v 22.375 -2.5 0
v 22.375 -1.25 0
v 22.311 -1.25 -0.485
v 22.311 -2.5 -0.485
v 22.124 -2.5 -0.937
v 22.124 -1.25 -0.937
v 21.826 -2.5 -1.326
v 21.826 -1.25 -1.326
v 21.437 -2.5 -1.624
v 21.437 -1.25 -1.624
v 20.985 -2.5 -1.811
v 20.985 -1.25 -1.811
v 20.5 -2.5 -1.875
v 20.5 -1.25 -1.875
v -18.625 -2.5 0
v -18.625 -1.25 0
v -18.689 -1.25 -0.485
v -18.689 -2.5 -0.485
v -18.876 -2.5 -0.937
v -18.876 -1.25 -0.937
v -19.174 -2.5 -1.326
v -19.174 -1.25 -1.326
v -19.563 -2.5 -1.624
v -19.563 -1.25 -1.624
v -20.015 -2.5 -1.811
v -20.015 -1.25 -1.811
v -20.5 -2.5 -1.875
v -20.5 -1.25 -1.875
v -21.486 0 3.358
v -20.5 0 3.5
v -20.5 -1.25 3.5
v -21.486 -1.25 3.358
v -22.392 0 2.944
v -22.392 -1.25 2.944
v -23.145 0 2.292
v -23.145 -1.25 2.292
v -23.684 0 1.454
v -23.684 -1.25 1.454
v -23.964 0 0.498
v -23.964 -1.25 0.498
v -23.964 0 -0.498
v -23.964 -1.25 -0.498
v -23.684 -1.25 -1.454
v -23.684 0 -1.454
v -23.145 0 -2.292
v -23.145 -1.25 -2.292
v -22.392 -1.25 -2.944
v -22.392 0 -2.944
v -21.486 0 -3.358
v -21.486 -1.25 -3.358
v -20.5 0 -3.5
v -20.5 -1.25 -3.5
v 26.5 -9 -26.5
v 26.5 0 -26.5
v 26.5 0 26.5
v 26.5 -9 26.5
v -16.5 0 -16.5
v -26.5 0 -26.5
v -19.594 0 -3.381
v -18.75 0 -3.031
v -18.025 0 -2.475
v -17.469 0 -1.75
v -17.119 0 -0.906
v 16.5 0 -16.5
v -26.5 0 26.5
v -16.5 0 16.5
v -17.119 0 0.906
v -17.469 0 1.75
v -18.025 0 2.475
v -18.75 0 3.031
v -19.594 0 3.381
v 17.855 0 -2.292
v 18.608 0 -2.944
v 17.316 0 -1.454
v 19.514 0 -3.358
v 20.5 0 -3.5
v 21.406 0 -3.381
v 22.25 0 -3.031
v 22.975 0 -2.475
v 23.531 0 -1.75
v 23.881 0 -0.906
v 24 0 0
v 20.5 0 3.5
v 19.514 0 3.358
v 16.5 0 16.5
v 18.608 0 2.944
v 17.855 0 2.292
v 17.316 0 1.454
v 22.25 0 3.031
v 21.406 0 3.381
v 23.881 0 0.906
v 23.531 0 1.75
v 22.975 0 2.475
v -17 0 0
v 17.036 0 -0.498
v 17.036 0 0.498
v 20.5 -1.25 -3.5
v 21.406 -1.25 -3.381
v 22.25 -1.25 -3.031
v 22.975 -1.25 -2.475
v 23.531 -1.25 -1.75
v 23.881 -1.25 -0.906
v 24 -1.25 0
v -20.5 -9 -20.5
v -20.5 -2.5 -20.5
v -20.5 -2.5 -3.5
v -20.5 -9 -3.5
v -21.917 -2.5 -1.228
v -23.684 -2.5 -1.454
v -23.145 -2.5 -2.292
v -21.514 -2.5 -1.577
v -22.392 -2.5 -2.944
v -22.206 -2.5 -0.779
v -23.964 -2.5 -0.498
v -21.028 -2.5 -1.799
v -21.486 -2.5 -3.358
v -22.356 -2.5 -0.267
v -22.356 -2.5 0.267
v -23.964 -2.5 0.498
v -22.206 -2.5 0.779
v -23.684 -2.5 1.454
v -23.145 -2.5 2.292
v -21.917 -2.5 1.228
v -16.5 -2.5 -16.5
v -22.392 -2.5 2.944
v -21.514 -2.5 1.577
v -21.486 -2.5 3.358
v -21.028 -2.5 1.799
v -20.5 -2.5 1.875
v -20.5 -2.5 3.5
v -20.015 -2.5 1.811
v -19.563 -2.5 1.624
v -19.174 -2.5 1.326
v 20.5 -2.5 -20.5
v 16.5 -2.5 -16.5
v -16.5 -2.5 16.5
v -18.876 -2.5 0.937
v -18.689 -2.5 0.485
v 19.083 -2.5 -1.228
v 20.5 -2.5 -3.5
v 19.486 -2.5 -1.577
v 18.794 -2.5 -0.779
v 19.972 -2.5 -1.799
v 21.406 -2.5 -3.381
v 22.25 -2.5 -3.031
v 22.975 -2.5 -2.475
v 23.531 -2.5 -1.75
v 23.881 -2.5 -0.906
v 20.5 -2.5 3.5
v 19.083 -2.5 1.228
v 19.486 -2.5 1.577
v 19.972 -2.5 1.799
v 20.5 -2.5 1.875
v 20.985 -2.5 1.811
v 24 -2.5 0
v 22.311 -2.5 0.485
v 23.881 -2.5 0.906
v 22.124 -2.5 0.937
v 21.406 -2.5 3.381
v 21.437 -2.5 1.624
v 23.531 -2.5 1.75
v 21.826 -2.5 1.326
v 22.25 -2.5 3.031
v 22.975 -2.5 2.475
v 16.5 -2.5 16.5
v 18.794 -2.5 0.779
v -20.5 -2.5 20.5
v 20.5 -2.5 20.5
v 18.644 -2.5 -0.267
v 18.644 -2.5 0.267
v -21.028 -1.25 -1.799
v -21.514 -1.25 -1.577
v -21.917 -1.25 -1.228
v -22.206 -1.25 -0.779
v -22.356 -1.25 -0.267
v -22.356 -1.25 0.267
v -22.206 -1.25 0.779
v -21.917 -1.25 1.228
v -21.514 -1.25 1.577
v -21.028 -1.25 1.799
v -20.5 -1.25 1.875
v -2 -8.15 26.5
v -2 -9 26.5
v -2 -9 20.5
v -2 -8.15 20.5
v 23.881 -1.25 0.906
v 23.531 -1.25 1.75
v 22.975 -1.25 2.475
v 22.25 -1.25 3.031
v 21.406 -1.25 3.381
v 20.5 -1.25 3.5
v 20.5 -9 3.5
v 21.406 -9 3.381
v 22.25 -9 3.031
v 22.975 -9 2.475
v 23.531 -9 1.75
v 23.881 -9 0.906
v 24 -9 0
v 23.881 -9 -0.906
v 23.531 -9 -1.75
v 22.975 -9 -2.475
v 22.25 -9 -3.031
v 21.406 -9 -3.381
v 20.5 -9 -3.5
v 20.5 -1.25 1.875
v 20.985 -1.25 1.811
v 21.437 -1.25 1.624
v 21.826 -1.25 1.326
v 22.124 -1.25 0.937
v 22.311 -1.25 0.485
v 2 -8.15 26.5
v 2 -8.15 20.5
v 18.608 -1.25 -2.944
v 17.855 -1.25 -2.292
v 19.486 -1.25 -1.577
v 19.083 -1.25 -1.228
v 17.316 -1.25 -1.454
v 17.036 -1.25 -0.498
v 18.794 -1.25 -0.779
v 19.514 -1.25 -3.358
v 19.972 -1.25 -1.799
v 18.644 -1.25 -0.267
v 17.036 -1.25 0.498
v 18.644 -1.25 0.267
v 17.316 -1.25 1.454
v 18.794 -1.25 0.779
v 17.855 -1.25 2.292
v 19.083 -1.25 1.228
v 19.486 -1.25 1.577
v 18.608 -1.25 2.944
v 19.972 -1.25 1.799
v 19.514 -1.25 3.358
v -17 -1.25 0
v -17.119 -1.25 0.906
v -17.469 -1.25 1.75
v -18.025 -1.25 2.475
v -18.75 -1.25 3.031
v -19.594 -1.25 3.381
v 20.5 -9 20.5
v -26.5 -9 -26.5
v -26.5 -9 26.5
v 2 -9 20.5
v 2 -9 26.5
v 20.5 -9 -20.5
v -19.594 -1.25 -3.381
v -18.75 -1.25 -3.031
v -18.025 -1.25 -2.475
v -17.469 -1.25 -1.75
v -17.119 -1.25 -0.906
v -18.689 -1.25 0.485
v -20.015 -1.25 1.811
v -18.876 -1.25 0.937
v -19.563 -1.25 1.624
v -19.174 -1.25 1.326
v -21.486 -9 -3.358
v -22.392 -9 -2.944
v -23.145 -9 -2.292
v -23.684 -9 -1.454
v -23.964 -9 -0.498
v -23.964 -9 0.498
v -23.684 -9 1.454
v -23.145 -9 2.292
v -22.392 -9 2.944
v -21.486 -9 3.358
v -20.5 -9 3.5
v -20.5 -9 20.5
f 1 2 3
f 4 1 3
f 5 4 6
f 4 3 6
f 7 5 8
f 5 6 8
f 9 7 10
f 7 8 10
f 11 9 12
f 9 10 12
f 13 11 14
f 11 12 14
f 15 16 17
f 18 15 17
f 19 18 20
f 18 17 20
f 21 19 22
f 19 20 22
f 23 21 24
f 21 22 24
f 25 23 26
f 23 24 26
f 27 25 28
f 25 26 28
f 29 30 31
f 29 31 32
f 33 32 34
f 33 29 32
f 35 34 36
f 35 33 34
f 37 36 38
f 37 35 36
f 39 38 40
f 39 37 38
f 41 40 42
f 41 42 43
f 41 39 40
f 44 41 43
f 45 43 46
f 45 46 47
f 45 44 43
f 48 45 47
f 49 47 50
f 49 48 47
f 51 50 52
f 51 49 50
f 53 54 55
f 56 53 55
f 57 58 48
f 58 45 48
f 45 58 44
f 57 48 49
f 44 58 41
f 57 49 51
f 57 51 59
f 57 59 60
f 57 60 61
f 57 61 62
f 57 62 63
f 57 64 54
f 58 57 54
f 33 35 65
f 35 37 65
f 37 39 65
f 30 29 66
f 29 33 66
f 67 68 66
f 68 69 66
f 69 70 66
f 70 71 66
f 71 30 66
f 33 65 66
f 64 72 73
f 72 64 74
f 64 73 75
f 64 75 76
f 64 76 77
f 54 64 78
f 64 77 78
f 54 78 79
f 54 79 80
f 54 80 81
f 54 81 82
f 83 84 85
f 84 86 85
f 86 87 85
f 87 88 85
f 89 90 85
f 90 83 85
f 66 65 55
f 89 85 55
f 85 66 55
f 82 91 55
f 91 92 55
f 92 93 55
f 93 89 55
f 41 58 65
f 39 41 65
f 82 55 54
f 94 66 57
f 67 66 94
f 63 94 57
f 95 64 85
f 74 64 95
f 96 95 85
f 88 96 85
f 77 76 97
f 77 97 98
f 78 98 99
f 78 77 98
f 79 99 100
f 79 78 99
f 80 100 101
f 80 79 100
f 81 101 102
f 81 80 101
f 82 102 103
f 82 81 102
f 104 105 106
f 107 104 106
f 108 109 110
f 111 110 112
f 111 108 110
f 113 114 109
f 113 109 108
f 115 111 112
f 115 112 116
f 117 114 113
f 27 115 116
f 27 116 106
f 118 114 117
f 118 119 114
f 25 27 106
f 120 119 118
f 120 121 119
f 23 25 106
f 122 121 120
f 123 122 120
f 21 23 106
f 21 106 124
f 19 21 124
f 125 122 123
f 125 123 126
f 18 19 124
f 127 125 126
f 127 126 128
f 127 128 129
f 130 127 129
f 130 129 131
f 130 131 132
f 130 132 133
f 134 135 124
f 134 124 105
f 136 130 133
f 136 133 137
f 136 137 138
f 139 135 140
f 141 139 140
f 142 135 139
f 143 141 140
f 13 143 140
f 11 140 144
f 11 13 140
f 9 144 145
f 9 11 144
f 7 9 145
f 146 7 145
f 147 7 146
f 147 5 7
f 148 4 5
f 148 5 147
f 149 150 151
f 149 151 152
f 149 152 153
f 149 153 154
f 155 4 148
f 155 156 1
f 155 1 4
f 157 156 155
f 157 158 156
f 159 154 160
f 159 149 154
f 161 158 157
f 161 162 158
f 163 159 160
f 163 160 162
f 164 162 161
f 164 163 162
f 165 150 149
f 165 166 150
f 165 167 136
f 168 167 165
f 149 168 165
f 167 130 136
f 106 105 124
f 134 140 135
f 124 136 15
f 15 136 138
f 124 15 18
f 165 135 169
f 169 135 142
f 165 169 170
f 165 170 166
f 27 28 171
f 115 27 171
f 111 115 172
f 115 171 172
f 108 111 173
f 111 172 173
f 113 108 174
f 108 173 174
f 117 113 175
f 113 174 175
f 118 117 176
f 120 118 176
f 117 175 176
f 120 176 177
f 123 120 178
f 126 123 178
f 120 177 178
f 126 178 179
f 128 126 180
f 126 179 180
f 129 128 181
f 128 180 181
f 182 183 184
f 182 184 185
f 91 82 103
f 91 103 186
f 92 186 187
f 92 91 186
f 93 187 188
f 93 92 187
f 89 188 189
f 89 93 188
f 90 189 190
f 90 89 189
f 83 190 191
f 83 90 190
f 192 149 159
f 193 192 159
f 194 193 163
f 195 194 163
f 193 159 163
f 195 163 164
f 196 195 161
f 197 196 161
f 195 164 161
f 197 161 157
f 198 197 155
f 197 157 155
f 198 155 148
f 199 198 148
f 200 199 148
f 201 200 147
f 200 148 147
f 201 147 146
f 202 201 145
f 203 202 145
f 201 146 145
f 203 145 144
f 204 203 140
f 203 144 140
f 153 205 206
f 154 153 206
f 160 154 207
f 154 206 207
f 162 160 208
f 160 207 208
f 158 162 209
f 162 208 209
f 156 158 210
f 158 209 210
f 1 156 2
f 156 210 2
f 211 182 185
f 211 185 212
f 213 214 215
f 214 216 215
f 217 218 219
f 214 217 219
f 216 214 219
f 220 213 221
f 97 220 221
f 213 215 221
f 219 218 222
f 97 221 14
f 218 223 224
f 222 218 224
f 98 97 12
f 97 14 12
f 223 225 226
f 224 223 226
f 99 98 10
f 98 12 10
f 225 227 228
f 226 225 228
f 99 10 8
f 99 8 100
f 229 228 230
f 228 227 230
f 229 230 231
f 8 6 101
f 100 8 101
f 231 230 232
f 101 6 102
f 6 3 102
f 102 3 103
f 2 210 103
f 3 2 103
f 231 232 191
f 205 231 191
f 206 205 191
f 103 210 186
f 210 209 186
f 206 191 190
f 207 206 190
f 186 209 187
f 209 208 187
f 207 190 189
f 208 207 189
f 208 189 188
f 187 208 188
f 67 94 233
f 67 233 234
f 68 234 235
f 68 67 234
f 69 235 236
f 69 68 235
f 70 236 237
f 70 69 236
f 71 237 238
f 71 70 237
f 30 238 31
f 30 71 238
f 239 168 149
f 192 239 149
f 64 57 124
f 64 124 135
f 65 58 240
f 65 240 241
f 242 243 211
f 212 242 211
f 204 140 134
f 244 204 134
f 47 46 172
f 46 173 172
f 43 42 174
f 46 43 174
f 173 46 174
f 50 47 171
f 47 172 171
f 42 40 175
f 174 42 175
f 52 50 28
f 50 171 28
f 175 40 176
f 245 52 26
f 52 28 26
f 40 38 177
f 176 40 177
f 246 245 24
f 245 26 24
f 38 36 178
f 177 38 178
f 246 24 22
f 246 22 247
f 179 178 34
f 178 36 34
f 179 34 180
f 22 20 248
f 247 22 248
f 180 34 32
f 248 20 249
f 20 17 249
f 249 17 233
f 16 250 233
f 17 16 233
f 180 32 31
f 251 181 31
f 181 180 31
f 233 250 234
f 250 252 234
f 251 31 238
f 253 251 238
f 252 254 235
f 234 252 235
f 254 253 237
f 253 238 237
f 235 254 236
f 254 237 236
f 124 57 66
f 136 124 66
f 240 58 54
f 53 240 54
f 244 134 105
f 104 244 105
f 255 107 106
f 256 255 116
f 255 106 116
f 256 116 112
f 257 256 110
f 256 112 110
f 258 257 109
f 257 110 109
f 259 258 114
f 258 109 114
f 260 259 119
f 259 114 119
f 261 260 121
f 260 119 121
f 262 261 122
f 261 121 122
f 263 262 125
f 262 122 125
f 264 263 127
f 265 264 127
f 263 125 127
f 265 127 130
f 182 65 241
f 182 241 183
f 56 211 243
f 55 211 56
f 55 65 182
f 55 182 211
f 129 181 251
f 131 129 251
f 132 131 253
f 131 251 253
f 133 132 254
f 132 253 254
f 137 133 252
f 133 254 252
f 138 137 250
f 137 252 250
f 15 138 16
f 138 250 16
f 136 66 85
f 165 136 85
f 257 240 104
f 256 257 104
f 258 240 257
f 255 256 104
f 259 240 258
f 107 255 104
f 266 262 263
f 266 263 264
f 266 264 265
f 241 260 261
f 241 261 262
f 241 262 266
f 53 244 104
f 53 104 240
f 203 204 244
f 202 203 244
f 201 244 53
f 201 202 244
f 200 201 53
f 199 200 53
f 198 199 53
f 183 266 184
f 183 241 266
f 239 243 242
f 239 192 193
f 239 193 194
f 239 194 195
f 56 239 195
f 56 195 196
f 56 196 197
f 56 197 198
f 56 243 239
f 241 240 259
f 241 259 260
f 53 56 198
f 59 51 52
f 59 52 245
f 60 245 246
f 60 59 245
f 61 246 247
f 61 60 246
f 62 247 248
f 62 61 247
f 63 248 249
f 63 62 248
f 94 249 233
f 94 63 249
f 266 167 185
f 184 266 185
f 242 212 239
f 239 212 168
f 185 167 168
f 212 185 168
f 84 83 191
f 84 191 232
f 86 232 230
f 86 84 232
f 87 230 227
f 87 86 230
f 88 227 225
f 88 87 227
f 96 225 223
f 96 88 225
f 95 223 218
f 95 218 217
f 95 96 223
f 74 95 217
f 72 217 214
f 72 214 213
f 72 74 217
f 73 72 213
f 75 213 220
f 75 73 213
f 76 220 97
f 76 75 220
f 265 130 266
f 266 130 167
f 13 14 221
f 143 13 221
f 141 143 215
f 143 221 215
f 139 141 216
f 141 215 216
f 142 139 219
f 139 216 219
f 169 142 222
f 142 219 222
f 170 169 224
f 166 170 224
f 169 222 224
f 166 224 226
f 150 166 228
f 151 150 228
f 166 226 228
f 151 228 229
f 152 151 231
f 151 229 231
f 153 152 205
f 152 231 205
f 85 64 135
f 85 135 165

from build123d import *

# Parameters (mm, degrees)
F0_W     = 33
F0_H     = 33
F1_DEPTH = 2.5
F0_W_2   = 53
F0_H_2   = 53
F0_W_3   = 49.5
F0_H_3   = 49.5
F2_DEPTH = 9
F3_W     = 4
F3_H     = 0.85
F4_DEPTH = 6.75
F5_DEPTH = 2.5
F6_DEPTH = 1.25


with BuildPart() as f1:
    # F0 (on Front) → F1 (new body)
    with BuildSketch(Plane.XZ):
        with BuildLine():
            Line((-20.5, -20.5), (20.5, -20.5))
            Line((20.5, -20.5), (20.5, -3.5))
            ThreePointArc((20.5, -3.5), (17, 0), (20.5, 3.5))
            Line((20.5, 3.5), (20.5, 20.5))
            Line((20.5, 20.5), (-20.5, 20.5))
            Line((-20.5, 20.5), (-20.5, 3.5))
            ThreePointArc((-20.5, 3.5), (-18.0251262658, 2.4748737342), (-17, 0))
            ThreePointArc((-17, 0), (-18.0251262658, -2.4748737342), (-20.5, -3.5))
            Line((-20.5, -3.5), (-20.5, -20.5))
        make_face()
        Rectangle(F0_W, F0_H, mode=Mode.SUBTRACT)
    extrude(amount=F1_DEPTH)

    # F0 (on Front) → F2 (join)
    with BuildSketch(Plane.XZ):
        Rectangle(F0_W_2, F0_H_2)
        Rectangle(F0_W_3, F0_H_3, mode=Mode.SUBTRACT)
        Rectangle(F0_W_3, F0_H_3)
        with BuildLine():
            Line((20.5, -3.5), (20.5, -20.5))
            Line((20.5, -20.5), (-20.5, -20.5))
            Line((-20.5, -20.5), (-20.5, -3.5))
            ThreePointArc((-20.5, -3.5), (-24, 0), (-20.5, 3.5))
            Line((-20.5, 3.5), (-20.5, 20.5))
            Line((-20.5, 20.5), (20.5, 20.5))
            Line((20.5, 20.5), (20.5, 3.5))
            ThreePointArc((20.5, 3.5), (22.9748737342, 2.4748737342), (24, 0))
            ThreePointArc((24, 0), (22.9748737342, -2.4748737342), (20.5, -3.5))
        make_face(mode=Mode.SUBTRACT)
    extrude(amount=F2_DEPTH)

    # F3 (on face) → F4 (cut)
    with BuildSketch(Plane.XY.offset(26.5)):
        with Locations((0, -8.575)):
            Rectangle(F3_W, F3_H)
    extrude(amount=-F4_DEPTH, mode=Mode.SUBTRACT)

    # F0 (on Front) → F5 (join)
    with BuildSketch(Plane.XZ):
        with BuildLine():
            ThreePointArc((20.5, 3.5), (17, 0), (20.5, -3.5))
            Line((20.5, -3.5), (20.5, -1.875))
            ThreePointArc((20.5, -1.875), (18.625, 0), (20.5, 1.875))
            Line((20.5, 1.875), (20.5, 3.5))
        make_face()
        with BuildLine():
            Line((20.5, -1.875), (20.5, -3.5))
            ThreePointArc((20.5, -3.5), (22.9748737342, -2.4748737342), (24, 0))
            ThreePointArc((24, 0), (22.9748737342, 2.4748737342), (20.5, 3.5))
            Line((20.5, 3.5), (20.5, 1.875))
            ThreePointArc((20.5, 1.875), (21.8258252147, 1.3258252147), (22.375, 0))
            ThreePointArc((22.375, 0), (21.8258252147, -1.3258252147), (20.5, -1.875))
        make_face()
        with BuildLine():
            Line((-20.5, -1.875), (-20.5, -3.5))
            ThreePointArc((-20.5, -3.5), (-18.0251262658, -2.4748737342), (-17, 0))
            ThreePointArc((-17, 0), (-18.0251262658, 2.4748737342), (-20.5, 3.5))
            Line((-20.5, 3.5), (-20.5, 1.875))
            ThreePointArc((-20.5, 1.875), (-19.1741747853, 1.3258252147), (-18.625, 0))
            ThreePointArc((-18.625, 0), (-19.1741747853, -1.3258252147), (-20.5, -1.875))
        make_face()
        with BuildLine():
            ThreePointArc((-20.5, 3.5), (-24, 0), (-20.5, -3.5))
            Line((-20.5, -3.5), (-20.5, -1.875))
            ThreePointArc((-20.5, -1.875), (-22.375, 0), (-20.5, 1.875))
            Line((-20.5, 1.875), (-20.5, 3.5))
        make_face()
    extrude(amount=F5_DEPTH)

    # F0 (on Front) → F6 (cut)
    with BuildSketch(Plane.XZ):
        with BuildLine():
            ThreePointArc((20.5, 3.5), (17, 0), (20.5, -3.5))
            Line((20.5, -3.5), (20.5, -1.875))
            ThreePointArc((20.5, -1.875), (18.625, 0), (20.5, 1.875))
            Line((20.5, 1.875), (20.5, 3.5))
        make_face()
        with BuildLine():
            Line((20.5, -1.875), (20.5, -3.5))
            ThreePointArc((20.5, -3.5), (22.9748737342, -2.4748737342), (24, 0))
            ThreePointArc((24, 0), (22.9748737342, 2.4748737342), (20.5, 3.5))
            Line((20.5, 3.5), (20.5, 1.875))
            ThreePointArc((20.5, 1.875), (21.8258252147, 1.3258252147), (22.375, 0))
            ThreePointArc((22.375, 0), (21.8258252147, -1.3258252147), (20.5, -1.875))
        make_face()
        with BuildLine():
            Line((-20.5, -1.875), (-20.5, -3.5))
            ThreePointArc((-20.5, -3.5), (-18.0251262658, -2.4748737342), (-17, 0))
            ThreePointArc((-17, 0), (-18.0251262658, 2.4748737342), (-20.5, 3.5))
            Line((-20.5, 3.5), (-20.5, 1.875))
            ThreePointArc((-20.5, 1.875), (-19.1741747853, 1.3258252147), (-18.625, 0))
            ThreePointArc((-18.625, 0), (-19.1741747853, -1.3258252147), (-20.5, -1.875))
        make_face()
        with BuildLine():
            ThreePointArc((-20.5, 3.5), (-24, 0), (-20.5, -3.5))
            Line((-20.5, -3.5), (-20.5, -1.875))
            ThreePointArc((-20.5, -1.875), (-22.375, 0), (-20.5, 1.875))
            Line((-20.5, 1.875), (-20.5, 3.5))
        make_face()
    extrude(amount=F6_DEPTH, mode=Mode.SUBTRACT)


solid = f1.part
